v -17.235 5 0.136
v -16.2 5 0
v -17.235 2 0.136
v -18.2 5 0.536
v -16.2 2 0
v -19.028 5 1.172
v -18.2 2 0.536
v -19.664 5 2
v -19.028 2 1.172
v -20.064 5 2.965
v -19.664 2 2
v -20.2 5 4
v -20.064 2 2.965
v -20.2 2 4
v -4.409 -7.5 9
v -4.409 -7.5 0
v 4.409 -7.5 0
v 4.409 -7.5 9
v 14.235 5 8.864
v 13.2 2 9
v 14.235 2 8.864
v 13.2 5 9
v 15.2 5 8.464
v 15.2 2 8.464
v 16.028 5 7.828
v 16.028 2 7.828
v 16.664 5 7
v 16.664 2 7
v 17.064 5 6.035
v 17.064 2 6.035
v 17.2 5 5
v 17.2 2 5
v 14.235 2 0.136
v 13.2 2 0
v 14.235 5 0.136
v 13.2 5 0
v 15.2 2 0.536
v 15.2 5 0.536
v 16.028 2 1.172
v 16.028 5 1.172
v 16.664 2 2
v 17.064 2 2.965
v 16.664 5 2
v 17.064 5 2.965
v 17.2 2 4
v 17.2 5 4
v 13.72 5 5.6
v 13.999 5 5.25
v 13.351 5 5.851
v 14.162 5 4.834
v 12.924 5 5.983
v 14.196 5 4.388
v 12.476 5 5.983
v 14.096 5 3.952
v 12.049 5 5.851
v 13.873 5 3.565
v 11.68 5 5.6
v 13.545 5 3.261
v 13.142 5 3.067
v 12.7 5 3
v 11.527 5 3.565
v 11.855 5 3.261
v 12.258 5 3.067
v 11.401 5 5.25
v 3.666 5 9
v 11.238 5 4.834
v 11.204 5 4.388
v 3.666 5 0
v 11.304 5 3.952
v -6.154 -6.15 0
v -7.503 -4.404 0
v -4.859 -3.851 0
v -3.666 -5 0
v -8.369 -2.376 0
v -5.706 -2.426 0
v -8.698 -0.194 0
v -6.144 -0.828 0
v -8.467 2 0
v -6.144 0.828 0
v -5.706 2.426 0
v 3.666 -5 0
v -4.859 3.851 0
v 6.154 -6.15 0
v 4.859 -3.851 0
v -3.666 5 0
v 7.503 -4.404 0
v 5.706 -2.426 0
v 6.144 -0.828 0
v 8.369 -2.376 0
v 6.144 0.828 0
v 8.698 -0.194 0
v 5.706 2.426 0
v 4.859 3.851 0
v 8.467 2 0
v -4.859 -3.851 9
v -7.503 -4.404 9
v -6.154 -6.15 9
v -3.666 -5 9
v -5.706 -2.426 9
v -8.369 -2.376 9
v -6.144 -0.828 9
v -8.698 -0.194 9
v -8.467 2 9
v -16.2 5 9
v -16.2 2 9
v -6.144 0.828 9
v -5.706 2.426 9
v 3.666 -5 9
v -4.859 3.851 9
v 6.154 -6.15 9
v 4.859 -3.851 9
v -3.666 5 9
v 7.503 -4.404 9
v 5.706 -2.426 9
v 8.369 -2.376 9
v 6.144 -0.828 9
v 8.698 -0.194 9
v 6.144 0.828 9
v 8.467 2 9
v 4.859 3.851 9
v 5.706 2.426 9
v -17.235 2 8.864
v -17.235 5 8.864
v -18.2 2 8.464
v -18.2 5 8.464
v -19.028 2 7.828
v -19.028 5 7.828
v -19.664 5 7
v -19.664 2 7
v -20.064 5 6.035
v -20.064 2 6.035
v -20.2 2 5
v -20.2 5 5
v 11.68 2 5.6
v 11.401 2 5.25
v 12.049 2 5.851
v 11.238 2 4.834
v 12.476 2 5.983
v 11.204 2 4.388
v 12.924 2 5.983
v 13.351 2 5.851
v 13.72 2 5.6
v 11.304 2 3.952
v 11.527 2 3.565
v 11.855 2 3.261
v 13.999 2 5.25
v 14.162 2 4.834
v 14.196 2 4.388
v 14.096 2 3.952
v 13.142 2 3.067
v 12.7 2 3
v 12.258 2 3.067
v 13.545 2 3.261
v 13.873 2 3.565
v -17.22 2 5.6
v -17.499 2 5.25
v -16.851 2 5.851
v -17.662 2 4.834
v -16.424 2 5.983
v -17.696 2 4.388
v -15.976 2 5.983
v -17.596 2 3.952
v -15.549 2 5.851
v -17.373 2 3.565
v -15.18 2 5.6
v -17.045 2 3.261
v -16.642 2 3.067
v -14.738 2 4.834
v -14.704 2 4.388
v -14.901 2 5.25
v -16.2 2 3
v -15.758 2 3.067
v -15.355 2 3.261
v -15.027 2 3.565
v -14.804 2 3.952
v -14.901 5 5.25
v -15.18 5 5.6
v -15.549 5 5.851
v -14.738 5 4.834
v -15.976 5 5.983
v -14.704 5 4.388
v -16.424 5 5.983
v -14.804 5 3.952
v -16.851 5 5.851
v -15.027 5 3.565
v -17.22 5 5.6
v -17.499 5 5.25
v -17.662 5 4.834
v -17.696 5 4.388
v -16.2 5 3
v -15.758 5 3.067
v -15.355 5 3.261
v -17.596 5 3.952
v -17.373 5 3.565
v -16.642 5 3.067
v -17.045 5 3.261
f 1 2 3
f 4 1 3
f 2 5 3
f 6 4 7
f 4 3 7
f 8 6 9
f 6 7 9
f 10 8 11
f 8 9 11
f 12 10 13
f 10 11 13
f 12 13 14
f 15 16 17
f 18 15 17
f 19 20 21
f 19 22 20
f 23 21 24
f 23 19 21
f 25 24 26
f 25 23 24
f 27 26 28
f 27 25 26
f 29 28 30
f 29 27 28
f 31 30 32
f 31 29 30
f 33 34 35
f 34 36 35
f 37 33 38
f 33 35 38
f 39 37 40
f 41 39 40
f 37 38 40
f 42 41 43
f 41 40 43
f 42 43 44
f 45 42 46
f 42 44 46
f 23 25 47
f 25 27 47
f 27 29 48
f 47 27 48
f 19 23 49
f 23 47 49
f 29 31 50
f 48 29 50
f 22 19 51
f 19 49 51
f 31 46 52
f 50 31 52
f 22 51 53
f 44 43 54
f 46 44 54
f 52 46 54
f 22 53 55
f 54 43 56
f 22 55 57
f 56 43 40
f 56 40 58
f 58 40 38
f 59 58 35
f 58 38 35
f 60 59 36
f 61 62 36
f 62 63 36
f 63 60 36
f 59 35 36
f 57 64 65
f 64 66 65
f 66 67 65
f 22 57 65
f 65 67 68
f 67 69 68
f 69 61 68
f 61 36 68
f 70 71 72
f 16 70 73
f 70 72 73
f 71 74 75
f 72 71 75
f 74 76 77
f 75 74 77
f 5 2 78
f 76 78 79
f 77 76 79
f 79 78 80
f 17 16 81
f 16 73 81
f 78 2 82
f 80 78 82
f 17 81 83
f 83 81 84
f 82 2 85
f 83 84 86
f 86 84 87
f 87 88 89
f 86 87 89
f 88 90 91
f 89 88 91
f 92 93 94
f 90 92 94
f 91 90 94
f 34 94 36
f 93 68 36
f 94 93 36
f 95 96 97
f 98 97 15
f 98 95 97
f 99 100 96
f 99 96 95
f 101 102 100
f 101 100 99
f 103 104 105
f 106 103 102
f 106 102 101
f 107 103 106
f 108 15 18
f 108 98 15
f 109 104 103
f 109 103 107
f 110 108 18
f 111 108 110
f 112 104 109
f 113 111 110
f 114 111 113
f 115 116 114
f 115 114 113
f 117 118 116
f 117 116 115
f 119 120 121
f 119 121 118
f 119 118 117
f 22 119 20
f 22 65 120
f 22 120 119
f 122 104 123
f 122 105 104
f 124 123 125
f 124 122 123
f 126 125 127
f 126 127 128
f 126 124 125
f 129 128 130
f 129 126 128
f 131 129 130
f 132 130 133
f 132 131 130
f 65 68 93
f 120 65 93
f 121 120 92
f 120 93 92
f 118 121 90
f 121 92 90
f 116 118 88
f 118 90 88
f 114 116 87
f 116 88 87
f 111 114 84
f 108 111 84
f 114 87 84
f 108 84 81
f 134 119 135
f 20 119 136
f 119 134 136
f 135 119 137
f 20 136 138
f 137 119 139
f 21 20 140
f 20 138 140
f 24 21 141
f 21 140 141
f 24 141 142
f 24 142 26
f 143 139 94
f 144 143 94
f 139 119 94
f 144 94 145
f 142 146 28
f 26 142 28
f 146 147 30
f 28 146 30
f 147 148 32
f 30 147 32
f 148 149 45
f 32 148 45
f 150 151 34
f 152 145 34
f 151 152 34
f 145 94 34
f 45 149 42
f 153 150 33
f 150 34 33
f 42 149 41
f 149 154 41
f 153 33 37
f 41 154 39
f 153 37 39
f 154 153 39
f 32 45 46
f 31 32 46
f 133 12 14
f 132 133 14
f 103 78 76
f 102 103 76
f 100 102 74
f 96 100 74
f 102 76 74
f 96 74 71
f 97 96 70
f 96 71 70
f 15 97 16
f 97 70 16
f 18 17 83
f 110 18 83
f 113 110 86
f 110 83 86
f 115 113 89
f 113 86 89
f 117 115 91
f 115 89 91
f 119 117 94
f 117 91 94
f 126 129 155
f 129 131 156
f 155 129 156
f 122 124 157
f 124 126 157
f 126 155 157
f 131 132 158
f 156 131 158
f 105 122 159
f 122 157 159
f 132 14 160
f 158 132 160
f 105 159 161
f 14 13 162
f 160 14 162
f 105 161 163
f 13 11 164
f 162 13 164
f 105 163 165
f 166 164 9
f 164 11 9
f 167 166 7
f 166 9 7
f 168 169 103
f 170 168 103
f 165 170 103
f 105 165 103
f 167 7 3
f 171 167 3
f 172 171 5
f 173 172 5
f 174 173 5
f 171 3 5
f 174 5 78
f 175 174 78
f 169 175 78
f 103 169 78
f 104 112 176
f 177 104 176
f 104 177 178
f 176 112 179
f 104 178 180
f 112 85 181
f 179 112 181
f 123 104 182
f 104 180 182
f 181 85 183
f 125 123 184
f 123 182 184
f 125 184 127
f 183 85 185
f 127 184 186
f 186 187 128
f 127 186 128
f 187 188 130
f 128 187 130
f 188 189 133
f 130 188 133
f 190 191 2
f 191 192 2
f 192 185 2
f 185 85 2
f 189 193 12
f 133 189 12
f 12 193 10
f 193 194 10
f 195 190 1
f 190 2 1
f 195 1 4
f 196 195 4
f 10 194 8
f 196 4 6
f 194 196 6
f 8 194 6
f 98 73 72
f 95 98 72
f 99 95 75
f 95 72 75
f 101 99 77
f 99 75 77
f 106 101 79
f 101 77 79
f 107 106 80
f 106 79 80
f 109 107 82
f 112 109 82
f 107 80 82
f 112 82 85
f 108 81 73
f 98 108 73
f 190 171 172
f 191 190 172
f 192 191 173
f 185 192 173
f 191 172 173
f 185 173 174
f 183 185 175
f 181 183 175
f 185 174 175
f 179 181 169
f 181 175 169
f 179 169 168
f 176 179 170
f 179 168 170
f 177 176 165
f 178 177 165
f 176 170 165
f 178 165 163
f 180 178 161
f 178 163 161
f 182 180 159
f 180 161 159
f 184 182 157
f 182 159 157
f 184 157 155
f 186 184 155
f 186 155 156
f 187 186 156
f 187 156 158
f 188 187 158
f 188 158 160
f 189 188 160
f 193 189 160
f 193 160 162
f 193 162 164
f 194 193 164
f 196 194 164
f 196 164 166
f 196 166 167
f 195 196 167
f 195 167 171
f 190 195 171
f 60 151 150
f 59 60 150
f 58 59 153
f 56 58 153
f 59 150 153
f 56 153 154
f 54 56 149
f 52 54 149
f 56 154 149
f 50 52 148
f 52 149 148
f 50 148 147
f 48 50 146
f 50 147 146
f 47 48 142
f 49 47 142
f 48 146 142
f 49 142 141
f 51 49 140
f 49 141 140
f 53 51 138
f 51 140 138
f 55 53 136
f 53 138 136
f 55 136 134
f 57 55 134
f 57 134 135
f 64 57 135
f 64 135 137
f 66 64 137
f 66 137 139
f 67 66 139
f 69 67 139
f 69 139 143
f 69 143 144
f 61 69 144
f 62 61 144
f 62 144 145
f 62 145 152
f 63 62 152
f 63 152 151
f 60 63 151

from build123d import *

# Parameters (mm, degrees)
BOSS_EXTRUDE1_DEPTH = 9
SKETCH2_R           = 1.5
CUT_EXTRUDE1_DEPTH  = 10
FILLET1_R           = 4


with BuildPart() as part:
    # Sketch1 → Boss-Extrude1 (new body)
    with BuildSketch(Plane.XY):
        with BuildLine():
            ThreePointArc((3.666060556, 5), (6.2, 0), (3.666060556, -5))
            Line((3.666060556, -5), (-3.666060556, -5))
            ThreePointArc((-3.666060556, -5), (-6.2, 0), (-3.666060556, 5))
            Line((-3.666060556, 5), (-20.2, 5))
            Line((-20.2, 5), (-20.2, 2))
            Line((-20.2, 2), (-8.466994744, 2))
            ThreePointArc((-8.466994744, 2), (-8.000677165, -3.41747932), (-4.409081537, -7.5))
            Line((-4.409081537, -7.5), (4.409081537, -7.5))
            ThreePointArc((4.409081537, -7.5), (8.000677165, -3.41747932), (8.466994744, 2))
            Line((8.466994744, 2), (17.2, 2))
            Line((17.2, 2), (17.2, 5))
            Line((17.2, 5), (3.666060556, 5))
        make_face()
    extrude(amount=BOSS_EXTRUDE1_DEPTH)

    # Sketch2 → Cut-Extrude1 (cut)
    with BuildSketch(Plane.XZ.offset(-2)):
        with Locations(Location((-16.2, 4.5, 0), (0, 0, 270))):
            Circle(SKETCH2_R)
        with Locations(Location((12.7, 4.5, 0), (0, 0, 270))):
            Circle(SKETCH2_R)
    extrude(amount=-CUT_EXTRUDE1_DEPTH, mode=Mode.SUBTRACT)

    # Fillet1
    fillet1_edges = [part.edges().sort_by_distance(p)[0] for p in [
        (-20.2, 3.5, 0),
        (17.2, 3.5, 0),
        (17.2, 3.5, 9),
        (-20.2, 3.5, 9),
    ]]
    fillet(fillet1_edges, radius=FILLET1_R)


solid = part.part
